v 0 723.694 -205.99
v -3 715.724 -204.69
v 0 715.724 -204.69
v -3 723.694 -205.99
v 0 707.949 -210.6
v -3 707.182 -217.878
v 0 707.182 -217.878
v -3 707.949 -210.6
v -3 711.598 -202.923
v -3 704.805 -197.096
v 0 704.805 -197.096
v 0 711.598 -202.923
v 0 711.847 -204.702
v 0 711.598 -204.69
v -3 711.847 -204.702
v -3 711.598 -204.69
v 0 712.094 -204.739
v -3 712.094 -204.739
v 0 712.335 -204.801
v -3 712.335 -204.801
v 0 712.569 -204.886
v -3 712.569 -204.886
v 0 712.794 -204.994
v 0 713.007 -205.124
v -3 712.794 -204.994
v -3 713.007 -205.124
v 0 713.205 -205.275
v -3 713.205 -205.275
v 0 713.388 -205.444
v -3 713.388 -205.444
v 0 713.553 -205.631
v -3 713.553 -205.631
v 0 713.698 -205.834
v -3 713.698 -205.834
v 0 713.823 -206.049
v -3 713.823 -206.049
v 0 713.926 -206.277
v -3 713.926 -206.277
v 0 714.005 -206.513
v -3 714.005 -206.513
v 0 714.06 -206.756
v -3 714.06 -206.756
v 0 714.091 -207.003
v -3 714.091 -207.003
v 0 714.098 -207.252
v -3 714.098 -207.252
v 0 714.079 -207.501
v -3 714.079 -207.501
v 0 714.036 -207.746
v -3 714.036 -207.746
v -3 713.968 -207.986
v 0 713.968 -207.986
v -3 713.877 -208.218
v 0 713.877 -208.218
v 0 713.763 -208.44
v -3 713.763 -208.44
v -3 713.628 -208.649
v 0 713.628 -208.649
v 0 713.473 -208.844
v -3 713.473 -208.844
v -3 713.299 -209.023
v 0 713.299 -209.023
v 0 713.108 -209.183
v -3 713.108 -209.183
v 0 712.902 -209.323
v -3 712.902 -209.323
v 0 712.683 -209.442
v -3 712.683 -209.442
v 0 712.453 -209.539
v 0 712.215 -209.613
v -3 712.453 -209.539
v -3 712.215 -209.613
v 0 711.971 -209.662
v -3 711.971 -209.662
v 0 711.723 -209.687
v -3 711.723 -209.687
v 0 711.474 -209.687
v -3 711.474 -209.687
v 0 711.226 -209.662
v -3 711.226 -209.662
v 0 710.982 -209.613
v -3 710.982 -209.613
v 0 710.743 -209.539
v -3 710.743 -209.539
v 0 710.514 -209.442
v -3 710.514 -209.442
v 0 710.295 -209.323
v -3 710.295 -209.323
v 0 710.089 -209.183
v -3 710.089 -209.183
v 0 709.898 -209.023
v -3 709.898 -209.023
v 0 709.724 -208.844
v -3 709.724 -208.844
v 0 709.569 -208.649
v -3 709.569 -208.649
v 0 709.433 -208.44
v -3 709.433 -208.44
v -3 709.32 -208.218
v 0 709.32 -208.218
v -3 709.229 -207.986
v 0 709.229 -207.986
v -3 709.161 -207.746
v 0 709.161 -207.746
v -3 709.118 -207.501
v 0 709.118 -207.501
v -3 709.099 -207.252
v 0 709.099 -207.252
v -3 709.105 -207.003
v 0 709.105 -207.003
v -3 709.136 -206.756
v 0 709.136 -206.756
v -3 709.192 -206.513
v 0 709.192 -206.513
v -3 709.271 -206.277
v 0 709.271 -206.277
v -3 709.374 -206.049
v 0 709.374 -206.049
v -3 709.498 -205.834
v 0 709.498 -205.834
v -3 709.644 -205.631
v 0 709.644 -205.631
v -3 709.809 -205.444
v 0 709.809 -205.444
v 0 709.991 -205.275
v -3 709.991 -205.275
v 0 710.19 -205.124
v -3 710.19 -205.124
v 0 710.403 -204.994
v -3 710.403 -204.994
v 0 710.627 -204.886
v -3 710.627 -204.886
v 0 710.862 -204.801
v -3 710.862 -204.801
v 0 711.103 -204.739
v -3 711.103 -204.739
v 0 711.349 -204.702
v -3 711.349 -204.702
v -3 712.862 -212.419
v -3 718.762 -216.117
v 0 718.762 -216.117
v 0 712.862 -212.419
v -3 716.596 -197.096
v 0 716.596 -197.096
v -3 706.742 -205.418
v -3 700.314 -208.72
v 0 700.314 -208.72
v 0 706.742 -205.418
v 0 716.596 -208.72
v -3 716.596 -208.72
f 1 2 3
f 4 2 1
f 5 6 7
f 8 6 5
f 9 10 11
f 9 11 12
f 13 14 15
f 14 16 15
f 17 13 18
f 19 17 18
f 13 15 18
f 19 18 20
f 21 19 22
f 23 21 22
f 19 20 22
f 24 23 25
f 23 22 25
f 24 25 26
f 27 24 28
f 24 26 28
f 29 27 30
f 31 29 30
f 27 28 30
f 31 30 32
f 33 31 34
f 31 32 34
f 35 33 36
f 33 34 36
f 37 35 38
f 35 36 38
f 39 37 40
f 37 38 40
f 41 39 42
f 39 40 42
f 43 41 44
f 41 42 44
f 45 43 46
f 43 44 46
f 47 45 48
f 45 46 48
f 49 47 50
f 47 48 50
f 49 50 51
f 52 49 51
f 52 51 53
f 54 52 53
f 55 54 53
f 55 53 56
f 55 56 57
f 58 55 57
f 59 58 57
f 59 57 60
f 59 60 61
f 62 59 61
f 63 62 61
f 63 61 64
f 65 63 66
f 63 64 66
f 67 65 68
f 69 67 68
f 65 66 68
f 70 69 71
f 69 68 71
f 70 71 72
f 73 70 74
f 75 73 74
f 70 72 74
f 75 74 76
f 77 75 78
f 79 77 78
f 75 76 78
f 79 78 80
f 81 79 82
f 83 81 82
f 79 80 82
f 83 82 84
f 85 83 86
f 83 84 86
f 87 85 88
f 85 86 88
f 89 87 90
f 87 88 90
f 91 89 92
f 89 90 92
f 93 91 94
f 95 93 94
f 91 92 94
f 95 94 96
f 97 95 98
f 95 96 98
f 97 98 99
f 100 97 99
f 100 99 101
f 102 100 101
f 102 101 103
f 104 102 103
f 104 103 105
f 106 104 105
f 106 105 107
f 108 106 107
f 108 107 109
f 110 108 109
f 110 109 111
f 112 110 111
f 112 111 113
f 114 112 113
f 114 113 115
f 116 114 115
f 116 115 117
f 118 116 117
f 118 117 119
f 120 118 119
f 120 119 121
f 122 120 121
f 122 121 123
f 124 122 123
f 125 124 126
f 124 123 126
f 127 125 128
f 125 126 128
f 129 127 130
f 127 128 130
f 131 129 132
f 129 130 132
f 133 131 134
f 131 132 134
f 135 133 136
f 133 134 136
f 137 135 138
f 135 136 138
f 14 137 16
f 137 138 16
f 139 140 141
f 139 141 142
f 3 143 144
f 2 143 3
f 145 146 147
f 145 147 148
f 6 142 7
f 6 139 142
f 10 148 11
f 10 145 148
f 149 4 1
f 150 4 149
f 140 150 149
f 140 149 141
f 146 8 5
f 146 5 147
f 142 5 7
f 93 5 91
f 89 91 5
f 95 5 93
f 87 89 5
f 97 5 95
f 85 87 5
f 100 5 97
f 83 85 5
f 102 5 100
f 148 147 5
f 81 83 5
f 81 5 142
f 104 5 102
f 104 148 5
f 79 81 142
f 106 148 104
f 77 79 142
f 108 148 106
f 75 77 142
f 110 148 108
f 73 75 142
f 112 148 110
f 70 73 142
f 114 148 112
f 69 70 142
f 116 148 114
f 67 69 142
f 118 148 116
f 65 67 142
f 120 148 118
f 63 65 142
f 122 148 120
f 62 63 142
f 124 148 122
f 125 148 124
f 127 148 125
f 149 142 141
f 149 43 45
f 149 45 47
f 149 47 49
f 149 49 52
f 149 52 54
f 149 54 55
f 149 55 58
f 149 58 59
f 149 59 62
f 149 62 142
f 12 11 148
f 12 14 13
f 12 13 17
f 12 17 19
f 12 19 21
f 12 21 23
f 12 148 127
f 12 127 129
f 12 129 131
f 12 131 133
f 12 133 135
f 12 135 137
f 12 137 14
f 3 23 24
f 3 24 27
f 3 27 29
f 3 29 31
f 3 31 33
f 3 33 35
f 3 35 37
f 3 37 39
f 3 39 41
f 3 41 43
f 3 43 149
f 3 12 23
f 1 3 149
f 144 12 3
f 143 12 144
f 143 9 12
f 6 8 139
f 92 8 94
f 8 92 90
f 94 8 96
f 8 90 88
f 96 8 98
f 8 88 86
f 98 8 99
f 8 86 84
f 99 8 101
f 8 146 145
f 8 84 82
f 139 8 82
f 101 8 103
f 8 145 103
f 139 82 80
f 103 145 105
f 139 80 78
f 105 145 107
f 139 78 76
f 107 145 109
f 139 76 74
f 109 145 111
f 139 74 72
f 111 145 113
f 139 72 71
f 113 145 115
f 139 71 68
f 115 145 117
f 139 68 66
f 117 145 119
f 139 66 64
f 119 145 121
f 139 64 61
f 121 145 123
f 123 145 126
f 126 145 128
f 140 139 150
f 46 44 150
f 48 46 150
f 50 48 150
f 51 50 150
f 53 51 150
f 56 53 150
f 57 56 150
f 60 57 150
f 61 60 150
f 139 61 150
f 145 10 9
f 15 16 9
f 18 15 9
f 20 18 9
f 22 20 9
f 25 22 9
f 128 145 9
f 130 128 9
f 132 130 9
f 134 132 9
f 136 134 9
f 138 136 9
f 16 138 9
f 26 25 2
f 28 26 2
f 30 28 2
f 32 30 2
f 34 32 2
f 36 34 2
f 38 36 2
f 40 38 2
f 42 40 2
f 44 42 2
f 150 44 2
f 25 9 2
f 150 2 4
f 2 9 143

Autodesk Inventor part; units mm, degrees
ref_plane "YZ Plane" through (0, 0, 0) normal (1, 0, 0) x (0, 1, 0)
ref_plane "XZ Plane" through (0, 0, 0) normal (0, 1, 0) x (-1, 0, 0)
ref_plane "XY Plane" through (0, 0, 0) normal (0, 0, 1) x (1, 0, 0)
sketch "Esquisse1" plane through (0, 0, 0) normal (1, 0, 0) x (0, 1, 0)
  line L0 (615.5373, -142.1522) -> (811.8285, -142.1522) construction
  line L1 (811.8285, -142.1522) -> (811.8285, -230.5611) construction
  line L2 (811.8285, -230.5611) -> (615.5373, -230.5611) construction
  line L3 (615.5373, -230.5611) -> (615.5373, -142.1522) construction
  circle A0 centre (714.0804, -164.9097) radius 9.3044
  circle A1 centre (714.0804, -164.9097) radius 12.8446
  arc A2 (718.2667, -201.6616) -> (719.1833, -202.8097) centre (719.23, -201.8325) ccw
  arc A3 (719.6606, -209.9141) -> (719.248, -210.7518) centre (719.7361, -210.4718) ccw
  arc A4 (713.6782, -215.3851) -> (712.2032, -215.3703) centre (712.9331, -216.1323) ccw
  line L4 (711.5826, -198.3788) -> (715.3474, -192.8257)
  line L5 (715.3474, -192.8257) -> (719.8038, -195.0511)
  line L6 (719.8038, -195.0511) -> (718.2667, -201.6616)
  line L7 (719.1833, -202.8097) -> (725.8864, -202.9912)
  line L8 (725.8864, -202.9912) -> (726.1597, -208.1294)
  line L9 (726.1597, -208.1294) -> (719.6606, -209.9141)
  line L10 (719.248, -210.7518) -> (722.051, -216.9958)
  line L11 (722.051, -216.9958) -> (717.7376, -219.4332)
  line L12 (717.7376, -219.4332) -> (713.6782, -215.3851)
  line L13 (712.2032, -215.3703) -> (708.5343, -221.0039)
  line L14 (708.5343, -221.0039) -> (704.0426, -218.7609)
  line L15 (704.0426, -218.7609) -> (705.4927, -212.5247)
  line L16 (704.6548, -211.4369) -> (698.081, -211.076)
  line L17 (698.081, -211.076) -> (698.1175, -205.8223)
  line L18 (698.1175, -205.8223) -> (703.9597, -204.218)
  line L19 (704.461, -202.9923) -> (701.4433, -196.9238)
  line L20 (701.4433, -196.9238) -> (705.5988, -194.2119)
  line L21 (705.5988, -194.2119) -> (709.8549, -198.4562)
  arc A5 (719.8038, -195.0511) -> (715.3474, -192.8257) centre (717.4272, -194.2357) ccw
  arc A6 (726.1597, -208.1294) -> (725.8864, -202.9912) centre (725.4624, -205.5902) ccw
  arc A7 (717.7376, -219.4332) -> (722.051, -216.9958) centre (719.7814, -218.0147) ccw
  arc A8 (704.0426, -218.7609) -> (708.5343, -221.0039) centre (706.417, -219.625) ccw
  arc A9 (698.1175, -205.8223) -> (698.081, -211.076) centre (698.2252, -208.45) ccw
  arc A10 (705.5988, -194.2119) -> (701.4433, -196.9238) centre (703.68, -195.8115) ccw
  arc A11 (709.8549, -198.4562) -> (711.5826, -198.3788) centre (710.6833, -197.6255) ccw
  arc A12 (703.9597, -204.218) -> (704.461, -202.9923) centre (703.6717, -203.3848) ccw
  arc A13 (705.4927, -212.5247) -> (704.6548, -211.4369) centre (704.6286, -212.3238) ccw
  point P0 (0, 0)
extrude "Extrusion1" add sketch "Esquisse1" against normal blind 3 contours A2 L7 L8 L9 A3 L10 L11 L12 A4 L13 L14 L15 A13 L16 L17 L18 A12 L19 L20 L21 A11 L4 L5 L6 | L5 A5 | A6 L8 | L20 A10 | A7 L11 | L17 A9 | A8 L14
sketch "Esquisse17" plane through (-3, 0, 0) normal (-1, 0, 0) x (0, 0, 1)
  circle A0 centre (-207.1899, 711.5984) radius 2.5
  point P0 (0, 0)
  dimension "d66" = 5
extrude "Extrusion11" cut sketch "Esquisse17" against normal blind 10
sketch "Esquisse18" plane through (-3, 0, 0) normal (-1, 0, 0) x (0, 0, 1)
  circle A0 centre (-207.1899, 711.5984) radius 2.5 projected
  line L0 (-208.7203, 700.3139) -> (-205.4181, 706.7422)
  line L1 (-205.4181, 706.7422) -> (-197.0964, 704.8049)
  line L2 (-197.0964, 704.8049) -> (-202.9234, 711.5984)
  line L3 (-202.9234, 711.5984) -> (-197.0964, 716.5964)
  line L4 (-197.0964, 716.5964) -> (-204.6899, 715.7243)
  line L5 (-204.6899, 715.7243) -> (-205.9905, 723.6937)
  line L6 (-205.9905, 723.6937) -> (-208.7203, 716.5964)
  line L7 (-208.7203, 716.5964) -> (-216.1173, 718.7623)
  line L8 (-216.1173, 718.7623) -> (-212.4188, 712.8623)
  line L9 (-212.4188, 712.8623) -> (-217.8785, 707.1825)
  line L10 (-217.8785, 707.1825) -> (-210.6003, 707.9486)
  line L11 (-210.6003, 707.9486) -> (-208.7203, 700.3139)
  circle A1 centre (-207.1899, 711.5984) radius 19.7592
  point P0 (0, 0)
extrude "Extrusion12" cut sketch "Esquisse18" against normal blind 10 contours A1
properties part number "palonnier"
